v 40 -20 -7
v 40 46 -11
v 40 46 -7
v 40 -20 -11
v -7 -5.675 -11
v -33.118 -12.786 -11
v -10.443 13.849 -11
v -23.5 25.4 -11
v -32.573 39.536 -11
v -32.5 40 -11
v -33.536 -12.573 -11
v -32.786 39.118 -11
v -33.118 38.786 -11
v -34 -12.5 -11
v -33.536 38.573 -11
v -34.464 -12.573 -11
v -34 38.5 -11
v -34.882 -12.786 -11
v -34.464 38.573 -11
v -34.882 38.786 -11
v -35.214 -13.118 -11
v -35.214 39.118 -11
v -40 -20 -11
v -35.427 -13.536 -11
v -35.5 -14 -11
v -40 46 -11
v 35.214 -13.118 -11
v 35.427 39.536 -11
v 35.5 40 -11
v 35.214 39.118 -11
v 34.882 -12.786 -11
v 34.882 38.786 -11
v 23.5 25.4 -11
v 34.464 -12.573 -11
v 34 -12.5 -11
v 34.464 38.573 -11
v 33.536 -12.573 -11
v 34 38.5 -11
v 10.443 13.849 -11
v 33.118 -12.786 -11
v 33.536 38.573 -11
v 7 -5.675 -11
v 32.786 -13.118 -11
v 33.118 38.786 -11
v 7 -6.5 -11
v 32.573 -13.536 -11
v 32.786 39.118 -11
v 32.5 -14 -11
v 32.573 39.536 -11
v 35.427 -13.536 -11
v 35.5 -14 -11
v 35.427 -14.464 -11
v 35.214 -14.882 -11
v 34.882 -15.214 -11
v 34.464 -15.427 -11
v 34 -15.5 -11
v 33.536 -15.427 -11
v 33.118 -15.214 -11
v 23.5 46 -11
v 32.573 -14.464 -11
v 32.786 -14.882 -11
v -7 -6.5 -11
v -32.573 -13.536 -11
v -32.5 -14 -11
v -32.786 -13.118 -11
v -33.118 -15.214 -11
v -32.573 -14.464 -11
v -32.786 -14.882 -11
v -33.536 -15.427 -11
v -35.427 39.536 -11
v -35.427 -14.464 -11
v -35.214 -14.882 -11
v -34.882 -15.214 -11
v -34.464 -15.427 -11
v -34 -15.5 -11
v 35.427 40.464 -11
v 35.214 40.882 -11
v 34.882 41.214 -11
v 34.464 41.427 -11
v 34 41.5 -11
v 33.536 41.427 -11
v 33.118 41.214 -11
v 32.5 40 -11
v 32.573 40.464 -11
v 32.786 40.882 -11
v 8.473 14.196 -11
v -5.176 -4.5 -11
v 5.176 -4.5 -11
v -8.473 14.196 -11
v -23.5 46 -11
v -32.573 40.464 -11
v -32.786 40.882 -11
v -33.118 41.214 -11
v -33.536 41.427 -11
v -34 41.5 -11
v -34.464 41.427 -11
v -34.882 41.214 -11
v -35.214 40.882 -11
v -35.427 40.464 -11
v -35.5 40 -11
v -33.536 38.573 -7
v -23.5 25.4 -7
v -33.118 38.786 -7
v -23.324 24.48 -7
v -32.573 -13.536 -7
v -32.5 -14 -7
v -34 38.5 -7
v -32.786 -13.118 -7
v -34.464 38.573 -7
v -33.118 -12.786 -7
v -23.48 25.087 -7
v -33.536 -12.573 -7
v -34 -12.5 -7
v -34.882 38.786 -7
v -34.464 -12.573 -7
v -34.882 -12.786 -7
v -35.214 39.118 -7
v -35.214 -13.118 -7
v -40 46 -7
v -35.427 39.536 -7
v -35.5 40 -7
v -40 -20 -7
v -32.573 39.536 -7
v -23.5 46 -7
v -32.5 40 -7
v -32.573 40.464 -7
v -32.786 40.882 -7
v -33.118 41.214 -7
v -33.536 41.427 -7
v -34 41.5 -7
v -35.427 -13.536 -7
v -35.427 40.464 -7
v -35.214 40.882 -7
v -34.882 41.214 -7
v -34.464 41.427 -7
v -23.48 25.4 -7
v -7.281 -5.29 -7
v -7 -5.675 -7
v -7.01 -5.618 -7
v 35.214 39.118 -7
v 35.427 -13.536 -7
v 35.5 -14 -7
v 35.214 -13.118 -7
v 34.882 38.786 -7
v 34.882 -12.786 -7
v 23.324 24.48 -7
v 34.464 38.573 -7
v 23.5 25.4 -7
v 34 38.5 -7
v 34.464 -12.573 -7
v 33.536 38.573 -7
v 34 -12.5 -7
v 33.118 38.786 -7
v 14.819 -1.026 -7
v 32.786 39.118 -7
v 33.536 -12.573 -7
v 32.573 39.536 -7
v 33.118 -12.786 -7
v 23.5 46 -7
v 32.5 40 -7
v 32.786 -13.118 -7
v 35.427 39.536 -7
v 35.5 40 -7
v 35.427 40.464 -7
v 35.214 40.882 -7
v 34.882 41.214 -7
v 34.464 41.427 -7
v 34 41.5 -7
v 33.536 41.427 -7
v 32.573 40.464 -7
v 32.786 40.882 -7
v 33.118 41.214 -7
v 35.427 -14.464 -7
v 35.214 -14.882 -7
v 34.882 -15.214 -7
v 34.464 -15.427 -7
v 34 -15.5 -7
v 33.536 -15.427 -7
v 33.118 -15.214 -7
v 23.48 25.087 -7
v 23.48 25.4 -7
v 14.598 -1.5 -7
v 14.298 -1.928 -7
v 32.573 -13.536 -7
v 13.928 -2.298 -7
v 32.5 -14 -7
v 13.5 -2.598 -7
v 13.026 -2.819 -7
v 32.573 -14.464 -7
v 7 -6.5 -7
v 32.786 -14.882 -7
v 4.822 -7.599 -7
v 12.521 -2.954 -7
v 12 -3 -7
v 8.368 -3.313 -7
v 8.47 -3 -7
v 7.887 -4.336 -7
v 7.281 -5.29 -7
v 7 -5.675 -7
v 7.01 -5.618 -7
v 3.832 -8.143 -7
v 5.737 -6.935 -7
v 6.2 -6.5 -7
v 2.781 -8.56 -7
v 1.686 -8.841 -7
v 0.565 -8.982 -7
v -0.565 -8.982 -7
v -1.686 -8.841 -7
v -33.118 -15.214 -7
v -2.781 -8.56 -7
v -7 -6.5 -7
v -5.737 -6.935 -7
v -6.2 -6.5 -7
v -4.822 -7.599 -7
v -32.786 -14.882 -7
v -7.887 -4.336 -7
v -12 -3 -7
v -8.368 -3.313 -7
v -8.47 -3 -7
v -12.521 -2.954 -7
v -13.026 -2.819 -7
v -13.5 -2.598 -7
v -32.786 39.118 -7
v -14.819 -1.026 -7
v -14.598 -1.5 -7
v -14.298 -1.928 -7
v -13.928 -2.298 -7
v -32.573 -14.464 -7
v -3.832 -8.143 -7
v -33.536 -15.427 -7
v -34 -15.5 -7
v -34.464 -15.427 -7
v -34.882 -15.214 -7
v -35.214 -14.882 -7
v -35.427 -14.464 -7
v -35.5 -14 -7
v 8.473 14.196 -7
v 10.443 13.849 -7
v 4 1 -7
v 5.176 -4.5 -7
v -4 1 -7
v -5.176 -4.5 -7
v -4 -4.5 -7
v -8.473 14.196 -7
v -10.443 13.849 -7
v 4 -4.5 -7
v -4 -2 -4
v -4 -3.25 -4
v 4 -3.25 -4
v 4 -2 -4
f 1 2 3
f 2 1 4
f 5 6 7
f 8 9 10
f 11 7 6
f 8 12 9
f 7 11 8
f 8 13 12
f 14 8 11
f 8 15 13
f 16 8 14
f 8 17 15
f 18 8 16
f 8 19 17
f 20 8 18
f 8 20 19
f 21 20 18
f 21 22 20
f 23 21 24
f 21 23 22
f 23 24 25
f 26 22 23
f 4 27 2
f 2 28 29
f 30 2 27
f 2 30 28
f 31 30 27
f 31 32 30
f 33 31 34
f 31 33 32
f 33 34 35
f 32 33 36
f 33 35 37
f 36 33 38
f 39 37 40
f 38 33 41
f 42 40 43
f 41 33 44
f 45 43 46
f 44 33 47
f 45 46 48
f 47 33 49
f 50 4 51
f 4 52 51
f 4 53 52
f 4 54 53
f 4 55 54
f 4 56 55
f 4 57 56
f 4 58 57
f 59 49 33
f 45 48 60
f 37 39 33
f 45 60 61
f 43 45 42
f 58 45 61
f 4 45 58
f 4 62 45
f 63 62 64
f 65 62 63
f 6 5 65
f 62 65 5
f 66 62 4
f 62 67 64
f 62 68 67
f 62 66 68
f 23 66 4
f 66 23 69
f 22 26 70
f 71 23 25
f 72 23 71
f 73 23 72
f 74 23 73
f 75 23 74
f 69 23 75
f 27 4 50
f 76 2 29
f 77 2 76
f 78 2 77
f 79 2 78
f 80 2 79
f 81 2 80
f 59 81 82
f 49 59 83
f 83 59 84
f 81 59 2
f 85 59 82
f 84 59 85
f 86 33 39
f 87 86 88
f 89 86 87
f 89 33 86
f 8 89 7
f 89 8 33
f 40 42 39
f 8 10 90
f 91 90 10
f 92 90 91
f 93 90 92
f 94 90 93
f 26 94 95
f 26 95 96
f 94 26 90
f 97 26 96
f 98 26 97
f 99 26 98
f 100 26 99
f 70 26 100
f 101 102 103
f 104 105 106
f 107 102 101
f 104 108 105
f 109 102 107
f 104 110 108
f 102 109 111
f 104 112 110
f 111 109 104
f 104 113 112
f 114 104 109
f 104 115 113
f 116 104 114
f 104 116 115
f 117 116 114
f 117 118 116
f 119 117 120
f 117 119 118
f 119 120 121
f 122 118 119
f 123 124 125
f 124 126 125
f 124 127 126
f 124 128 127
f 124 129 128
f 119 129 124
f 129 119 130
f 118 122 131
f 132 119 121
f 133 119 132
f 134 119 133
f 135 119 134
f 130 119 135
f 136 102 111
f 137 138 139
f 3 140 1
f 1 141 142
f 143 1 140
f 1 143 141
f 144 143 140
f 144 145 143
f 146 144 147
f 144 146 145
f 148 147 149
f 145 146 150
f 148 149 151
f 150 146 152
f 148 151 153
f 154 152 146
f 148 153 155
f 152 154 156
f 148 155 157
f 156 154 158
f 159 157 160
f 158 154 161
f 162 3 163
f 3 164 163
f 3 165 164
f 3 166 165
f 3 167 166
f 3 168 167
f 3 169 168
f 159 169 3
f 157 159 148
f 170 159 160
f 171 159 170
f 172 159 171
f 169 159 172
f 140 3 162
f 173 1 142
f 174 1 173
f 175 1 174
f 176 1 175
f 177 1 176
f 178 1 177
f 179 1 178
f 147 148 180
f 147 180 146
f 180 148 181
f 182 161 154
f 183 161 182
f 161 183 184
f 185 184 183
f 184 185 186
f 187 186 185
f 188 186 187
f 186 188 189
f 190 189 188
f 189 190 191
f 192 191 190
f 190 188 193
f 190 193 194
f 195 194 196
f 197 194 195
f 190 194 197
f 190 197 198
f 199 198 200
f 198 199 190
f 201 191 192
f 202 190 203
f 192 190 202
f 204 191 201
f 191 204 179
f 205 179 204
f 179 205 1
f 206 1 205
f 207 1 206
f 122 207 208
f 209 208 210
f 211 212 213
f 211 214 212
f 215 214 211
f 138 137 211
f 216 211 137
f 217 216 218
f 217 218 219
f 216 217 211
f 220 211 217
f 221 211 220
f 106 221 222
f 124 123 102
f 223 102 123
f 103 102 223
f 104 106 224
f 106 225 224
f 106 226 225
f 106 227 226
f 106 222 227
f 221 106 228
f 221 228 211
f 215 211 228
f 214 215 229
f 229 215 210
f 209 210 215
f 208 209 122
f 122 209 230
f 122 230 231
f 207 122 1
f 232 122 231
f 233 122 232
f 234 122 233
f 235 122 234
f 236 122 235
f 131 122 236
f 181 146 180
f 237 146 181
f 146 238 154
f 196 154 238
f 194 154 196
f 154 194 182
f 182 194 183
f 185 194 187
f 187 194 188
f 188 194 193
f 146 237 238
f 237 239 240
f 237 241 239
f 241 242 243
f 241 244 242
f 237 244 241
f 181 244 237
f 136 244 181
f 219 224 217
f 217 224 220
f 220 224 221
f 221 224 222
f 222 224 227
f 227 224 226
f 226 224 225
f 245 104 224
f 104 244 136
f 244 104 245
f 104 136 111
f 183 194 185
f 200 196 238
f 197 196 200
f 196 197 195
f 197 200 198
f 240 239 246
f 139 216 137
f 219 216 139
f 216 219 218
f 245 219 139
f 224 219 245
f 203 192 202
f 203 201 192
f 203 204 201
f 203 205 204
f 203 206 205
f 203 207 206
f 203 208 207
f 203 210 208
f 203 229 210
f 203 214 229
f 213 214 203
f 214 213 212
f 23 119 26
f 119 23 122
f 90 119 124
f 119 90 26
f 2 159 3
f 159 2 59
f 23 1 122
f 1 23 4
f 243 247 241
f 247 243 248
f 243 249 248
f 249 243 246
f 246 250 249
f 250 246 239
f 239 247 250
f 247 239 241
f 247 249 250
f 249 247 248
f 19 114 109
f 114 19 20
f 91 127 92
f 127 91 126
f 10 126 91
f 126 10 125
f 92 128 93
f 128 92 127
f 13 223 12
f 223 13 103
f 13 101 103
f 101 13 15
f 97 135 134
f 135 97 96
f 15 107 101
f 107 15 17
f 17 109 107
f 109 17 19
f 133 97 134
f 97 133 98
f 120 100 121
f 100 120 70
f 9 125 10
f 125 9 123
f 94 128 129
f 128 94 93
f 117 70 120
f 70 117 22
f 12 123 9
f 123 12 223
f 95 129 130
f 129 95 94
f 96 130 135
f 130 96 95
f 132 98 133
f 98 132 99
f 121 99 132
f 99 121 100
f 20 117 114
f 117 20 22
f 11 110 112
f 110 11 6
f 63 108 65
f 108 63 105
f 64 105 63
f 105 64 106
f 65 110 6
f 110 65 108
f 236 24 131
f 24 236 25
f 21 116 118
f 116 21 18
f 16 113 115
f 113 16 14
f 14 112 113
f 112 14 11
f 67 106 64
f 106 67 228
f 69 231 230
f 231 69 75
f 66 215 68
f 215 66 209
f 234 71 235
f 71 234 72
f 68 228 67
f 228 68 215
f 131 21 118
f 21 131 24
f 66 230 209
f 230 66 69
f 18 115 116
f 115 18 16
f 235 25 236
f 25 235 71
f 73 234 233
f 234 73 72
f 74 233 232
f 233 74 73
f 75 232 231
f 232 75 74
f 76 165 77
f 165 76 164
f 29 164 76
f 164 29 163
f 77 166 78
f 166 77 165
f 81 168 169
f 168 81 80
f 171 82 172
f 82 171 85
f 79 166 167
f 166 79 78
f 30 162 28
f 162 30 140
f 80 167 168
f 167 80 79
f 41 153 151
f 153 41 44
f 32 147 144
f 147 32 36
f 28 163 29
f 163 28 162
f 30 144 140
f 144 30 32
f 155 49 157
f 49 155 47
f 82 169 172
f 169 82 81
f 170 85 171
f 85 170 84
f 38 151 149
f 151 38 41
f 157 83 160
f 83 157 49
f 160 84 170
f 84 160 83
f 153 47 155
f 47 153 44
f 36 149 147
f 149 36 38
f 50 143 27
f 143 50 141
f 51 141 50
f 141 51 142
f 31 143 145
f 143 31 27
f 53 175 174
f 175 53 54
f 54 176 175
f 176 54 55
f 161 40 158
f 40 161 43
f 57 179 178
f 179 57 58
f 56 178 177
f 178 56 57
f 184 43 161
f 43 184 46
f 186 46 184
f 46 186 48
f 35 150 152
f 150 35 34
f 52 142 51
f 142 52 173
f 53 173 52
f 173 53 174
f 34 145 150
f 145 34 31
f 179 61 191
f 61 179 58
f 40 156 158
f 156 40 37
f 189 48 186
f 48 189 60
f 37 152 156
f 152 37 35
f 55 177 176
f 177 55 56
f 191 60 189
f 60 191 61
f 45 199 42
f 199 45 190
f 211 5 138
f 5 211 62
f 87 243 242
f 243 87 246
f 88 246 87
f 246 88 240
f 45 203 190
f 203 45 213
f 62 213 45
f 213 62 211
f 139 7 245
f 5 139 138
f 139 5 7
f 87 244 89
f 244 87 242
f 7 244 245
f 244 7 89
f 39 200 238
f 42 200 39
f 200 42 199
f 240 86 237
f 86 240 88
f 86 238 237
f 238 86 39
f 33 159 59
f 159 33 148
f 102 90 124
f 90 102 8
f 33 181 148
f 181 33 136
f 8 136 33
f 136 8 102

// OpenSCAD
part="1";
boltposx=[-34,34];
boltposy=[40,-14];
lyoff=-2;
//rotate([90,0])
mirror([0,0,part=="1"?1:0])
if(part=="4")
  spacer(6);
else if(part=="3")
{
  !mirror([0,0,1]) 
    tripod();
} else {
  %translate([0,0,11]) spacer(8);
  %translate([0,0,8]) tripod();
intersection() {
  if(part=="1")
  {
    translate([-40,-20,7]) cube([80,66,4]);
    latch();
  }
  else if(part=="2")
    translate([-40,-20]) cube([80,66,6.99]);
difference()
{
  translate([-40,-20,.01]) cube([80,66,11]);
  for(x=boltposx,y=boltposy) translate([x,y]) {
    cylinder(d=3,h=20,$fn=20);
    *translate([0,0,5]) cylinder(d1=3,d2=6,h=1.01,$fn=30);
    *translate([0,0,6]) cylinder(d=6,h=4,$fn=30);
  }
  difference() {
    union(){
      cylinder(d=18,h=7,$fn=50);
      linear_extrude(3) hull() {
        circle(d=18,$fn=50);
        translate([-17,25.4]) square([34,1]);
      }
      translate([0,0,2.99]) {
        linear_extrude(4.01) hull() {
          for(m=[0,1]) mirror([m,0]) {
            translate([-12,0]) circle(d=6,$fn=36);
            translate([-21,25.4]) circle(d=5,$fn=25);
          }
        }
      }
      translate([0,0,6.99]) {
        translate([5,-4.5+lyoff]) {
          translate([0,1]) rotate([0,0,-10]) cube([2,20,10]);
          translate([-12,2]) {
            translate([0,0]) mirror([0,1]) cube([14,2,10]);
            *translate([0,0,1]) rotate([0,90]) linear_extrude(12) {
              polygon([[-3,0],[4,0],[4,6]]);
            }
            translate([2,-1]) mirror([1,0]) rotate([0,0,-10]) cube([2,20,10]);
          }
        }
      }
    }
    if(part!="2")
      latch();

  }
  
  translate([-23.5,25.4]) cube([47,31,20]);
}
}
}
module spacer(h=8) {
  difference() {
    translate([-40,-20,.01]) cube([80,66,h]);
    for(x=boltposx,y=boltposy) translate([x,y]) {
      cylinder(d=3,h=30,$fn=20);
    }
    translate([-30,-10]) cube([60,46,h+.02]);
  }
}
module latch() {
  difference() {
      translate([-4,lyoff,7]) rotate([0,90,0]) linear_extrude(8) {
        *circle(d=5,h=8,$fn=25);
        polygon([[0,-2.5],[0,2],[0,3],[3,0],[3,-1.25],[0,-2.5]]);
        *translate([0,-2]) rotate([0,0,0]) square([4,4]);
      }
      *translate([-6,-5.5,7.99]) rotate([0,90]) linear_extrude(12) {
        polygon([[-3,0],[4,0],[4,5]]);
      }
    }
  }
module tripod() {
  difference() {
    translate([-40,-20,11]) cube([80,66,10]);
    for(x=boltposx,y=boltposy) translate([x,y]) {
      cylinder(d=3,h=30,$fn=20);
    }
    translate([0,12,10.99]) {
      cylinder(d=6.5,h=20,$fn=30);
      rotate([0,0,0]) translate([0,0,0]) cylinder(d=13,h=8,$fn=6);
    }
    *translate([-7,-4,10.99]) cube([14,8,3]);
  }
}
